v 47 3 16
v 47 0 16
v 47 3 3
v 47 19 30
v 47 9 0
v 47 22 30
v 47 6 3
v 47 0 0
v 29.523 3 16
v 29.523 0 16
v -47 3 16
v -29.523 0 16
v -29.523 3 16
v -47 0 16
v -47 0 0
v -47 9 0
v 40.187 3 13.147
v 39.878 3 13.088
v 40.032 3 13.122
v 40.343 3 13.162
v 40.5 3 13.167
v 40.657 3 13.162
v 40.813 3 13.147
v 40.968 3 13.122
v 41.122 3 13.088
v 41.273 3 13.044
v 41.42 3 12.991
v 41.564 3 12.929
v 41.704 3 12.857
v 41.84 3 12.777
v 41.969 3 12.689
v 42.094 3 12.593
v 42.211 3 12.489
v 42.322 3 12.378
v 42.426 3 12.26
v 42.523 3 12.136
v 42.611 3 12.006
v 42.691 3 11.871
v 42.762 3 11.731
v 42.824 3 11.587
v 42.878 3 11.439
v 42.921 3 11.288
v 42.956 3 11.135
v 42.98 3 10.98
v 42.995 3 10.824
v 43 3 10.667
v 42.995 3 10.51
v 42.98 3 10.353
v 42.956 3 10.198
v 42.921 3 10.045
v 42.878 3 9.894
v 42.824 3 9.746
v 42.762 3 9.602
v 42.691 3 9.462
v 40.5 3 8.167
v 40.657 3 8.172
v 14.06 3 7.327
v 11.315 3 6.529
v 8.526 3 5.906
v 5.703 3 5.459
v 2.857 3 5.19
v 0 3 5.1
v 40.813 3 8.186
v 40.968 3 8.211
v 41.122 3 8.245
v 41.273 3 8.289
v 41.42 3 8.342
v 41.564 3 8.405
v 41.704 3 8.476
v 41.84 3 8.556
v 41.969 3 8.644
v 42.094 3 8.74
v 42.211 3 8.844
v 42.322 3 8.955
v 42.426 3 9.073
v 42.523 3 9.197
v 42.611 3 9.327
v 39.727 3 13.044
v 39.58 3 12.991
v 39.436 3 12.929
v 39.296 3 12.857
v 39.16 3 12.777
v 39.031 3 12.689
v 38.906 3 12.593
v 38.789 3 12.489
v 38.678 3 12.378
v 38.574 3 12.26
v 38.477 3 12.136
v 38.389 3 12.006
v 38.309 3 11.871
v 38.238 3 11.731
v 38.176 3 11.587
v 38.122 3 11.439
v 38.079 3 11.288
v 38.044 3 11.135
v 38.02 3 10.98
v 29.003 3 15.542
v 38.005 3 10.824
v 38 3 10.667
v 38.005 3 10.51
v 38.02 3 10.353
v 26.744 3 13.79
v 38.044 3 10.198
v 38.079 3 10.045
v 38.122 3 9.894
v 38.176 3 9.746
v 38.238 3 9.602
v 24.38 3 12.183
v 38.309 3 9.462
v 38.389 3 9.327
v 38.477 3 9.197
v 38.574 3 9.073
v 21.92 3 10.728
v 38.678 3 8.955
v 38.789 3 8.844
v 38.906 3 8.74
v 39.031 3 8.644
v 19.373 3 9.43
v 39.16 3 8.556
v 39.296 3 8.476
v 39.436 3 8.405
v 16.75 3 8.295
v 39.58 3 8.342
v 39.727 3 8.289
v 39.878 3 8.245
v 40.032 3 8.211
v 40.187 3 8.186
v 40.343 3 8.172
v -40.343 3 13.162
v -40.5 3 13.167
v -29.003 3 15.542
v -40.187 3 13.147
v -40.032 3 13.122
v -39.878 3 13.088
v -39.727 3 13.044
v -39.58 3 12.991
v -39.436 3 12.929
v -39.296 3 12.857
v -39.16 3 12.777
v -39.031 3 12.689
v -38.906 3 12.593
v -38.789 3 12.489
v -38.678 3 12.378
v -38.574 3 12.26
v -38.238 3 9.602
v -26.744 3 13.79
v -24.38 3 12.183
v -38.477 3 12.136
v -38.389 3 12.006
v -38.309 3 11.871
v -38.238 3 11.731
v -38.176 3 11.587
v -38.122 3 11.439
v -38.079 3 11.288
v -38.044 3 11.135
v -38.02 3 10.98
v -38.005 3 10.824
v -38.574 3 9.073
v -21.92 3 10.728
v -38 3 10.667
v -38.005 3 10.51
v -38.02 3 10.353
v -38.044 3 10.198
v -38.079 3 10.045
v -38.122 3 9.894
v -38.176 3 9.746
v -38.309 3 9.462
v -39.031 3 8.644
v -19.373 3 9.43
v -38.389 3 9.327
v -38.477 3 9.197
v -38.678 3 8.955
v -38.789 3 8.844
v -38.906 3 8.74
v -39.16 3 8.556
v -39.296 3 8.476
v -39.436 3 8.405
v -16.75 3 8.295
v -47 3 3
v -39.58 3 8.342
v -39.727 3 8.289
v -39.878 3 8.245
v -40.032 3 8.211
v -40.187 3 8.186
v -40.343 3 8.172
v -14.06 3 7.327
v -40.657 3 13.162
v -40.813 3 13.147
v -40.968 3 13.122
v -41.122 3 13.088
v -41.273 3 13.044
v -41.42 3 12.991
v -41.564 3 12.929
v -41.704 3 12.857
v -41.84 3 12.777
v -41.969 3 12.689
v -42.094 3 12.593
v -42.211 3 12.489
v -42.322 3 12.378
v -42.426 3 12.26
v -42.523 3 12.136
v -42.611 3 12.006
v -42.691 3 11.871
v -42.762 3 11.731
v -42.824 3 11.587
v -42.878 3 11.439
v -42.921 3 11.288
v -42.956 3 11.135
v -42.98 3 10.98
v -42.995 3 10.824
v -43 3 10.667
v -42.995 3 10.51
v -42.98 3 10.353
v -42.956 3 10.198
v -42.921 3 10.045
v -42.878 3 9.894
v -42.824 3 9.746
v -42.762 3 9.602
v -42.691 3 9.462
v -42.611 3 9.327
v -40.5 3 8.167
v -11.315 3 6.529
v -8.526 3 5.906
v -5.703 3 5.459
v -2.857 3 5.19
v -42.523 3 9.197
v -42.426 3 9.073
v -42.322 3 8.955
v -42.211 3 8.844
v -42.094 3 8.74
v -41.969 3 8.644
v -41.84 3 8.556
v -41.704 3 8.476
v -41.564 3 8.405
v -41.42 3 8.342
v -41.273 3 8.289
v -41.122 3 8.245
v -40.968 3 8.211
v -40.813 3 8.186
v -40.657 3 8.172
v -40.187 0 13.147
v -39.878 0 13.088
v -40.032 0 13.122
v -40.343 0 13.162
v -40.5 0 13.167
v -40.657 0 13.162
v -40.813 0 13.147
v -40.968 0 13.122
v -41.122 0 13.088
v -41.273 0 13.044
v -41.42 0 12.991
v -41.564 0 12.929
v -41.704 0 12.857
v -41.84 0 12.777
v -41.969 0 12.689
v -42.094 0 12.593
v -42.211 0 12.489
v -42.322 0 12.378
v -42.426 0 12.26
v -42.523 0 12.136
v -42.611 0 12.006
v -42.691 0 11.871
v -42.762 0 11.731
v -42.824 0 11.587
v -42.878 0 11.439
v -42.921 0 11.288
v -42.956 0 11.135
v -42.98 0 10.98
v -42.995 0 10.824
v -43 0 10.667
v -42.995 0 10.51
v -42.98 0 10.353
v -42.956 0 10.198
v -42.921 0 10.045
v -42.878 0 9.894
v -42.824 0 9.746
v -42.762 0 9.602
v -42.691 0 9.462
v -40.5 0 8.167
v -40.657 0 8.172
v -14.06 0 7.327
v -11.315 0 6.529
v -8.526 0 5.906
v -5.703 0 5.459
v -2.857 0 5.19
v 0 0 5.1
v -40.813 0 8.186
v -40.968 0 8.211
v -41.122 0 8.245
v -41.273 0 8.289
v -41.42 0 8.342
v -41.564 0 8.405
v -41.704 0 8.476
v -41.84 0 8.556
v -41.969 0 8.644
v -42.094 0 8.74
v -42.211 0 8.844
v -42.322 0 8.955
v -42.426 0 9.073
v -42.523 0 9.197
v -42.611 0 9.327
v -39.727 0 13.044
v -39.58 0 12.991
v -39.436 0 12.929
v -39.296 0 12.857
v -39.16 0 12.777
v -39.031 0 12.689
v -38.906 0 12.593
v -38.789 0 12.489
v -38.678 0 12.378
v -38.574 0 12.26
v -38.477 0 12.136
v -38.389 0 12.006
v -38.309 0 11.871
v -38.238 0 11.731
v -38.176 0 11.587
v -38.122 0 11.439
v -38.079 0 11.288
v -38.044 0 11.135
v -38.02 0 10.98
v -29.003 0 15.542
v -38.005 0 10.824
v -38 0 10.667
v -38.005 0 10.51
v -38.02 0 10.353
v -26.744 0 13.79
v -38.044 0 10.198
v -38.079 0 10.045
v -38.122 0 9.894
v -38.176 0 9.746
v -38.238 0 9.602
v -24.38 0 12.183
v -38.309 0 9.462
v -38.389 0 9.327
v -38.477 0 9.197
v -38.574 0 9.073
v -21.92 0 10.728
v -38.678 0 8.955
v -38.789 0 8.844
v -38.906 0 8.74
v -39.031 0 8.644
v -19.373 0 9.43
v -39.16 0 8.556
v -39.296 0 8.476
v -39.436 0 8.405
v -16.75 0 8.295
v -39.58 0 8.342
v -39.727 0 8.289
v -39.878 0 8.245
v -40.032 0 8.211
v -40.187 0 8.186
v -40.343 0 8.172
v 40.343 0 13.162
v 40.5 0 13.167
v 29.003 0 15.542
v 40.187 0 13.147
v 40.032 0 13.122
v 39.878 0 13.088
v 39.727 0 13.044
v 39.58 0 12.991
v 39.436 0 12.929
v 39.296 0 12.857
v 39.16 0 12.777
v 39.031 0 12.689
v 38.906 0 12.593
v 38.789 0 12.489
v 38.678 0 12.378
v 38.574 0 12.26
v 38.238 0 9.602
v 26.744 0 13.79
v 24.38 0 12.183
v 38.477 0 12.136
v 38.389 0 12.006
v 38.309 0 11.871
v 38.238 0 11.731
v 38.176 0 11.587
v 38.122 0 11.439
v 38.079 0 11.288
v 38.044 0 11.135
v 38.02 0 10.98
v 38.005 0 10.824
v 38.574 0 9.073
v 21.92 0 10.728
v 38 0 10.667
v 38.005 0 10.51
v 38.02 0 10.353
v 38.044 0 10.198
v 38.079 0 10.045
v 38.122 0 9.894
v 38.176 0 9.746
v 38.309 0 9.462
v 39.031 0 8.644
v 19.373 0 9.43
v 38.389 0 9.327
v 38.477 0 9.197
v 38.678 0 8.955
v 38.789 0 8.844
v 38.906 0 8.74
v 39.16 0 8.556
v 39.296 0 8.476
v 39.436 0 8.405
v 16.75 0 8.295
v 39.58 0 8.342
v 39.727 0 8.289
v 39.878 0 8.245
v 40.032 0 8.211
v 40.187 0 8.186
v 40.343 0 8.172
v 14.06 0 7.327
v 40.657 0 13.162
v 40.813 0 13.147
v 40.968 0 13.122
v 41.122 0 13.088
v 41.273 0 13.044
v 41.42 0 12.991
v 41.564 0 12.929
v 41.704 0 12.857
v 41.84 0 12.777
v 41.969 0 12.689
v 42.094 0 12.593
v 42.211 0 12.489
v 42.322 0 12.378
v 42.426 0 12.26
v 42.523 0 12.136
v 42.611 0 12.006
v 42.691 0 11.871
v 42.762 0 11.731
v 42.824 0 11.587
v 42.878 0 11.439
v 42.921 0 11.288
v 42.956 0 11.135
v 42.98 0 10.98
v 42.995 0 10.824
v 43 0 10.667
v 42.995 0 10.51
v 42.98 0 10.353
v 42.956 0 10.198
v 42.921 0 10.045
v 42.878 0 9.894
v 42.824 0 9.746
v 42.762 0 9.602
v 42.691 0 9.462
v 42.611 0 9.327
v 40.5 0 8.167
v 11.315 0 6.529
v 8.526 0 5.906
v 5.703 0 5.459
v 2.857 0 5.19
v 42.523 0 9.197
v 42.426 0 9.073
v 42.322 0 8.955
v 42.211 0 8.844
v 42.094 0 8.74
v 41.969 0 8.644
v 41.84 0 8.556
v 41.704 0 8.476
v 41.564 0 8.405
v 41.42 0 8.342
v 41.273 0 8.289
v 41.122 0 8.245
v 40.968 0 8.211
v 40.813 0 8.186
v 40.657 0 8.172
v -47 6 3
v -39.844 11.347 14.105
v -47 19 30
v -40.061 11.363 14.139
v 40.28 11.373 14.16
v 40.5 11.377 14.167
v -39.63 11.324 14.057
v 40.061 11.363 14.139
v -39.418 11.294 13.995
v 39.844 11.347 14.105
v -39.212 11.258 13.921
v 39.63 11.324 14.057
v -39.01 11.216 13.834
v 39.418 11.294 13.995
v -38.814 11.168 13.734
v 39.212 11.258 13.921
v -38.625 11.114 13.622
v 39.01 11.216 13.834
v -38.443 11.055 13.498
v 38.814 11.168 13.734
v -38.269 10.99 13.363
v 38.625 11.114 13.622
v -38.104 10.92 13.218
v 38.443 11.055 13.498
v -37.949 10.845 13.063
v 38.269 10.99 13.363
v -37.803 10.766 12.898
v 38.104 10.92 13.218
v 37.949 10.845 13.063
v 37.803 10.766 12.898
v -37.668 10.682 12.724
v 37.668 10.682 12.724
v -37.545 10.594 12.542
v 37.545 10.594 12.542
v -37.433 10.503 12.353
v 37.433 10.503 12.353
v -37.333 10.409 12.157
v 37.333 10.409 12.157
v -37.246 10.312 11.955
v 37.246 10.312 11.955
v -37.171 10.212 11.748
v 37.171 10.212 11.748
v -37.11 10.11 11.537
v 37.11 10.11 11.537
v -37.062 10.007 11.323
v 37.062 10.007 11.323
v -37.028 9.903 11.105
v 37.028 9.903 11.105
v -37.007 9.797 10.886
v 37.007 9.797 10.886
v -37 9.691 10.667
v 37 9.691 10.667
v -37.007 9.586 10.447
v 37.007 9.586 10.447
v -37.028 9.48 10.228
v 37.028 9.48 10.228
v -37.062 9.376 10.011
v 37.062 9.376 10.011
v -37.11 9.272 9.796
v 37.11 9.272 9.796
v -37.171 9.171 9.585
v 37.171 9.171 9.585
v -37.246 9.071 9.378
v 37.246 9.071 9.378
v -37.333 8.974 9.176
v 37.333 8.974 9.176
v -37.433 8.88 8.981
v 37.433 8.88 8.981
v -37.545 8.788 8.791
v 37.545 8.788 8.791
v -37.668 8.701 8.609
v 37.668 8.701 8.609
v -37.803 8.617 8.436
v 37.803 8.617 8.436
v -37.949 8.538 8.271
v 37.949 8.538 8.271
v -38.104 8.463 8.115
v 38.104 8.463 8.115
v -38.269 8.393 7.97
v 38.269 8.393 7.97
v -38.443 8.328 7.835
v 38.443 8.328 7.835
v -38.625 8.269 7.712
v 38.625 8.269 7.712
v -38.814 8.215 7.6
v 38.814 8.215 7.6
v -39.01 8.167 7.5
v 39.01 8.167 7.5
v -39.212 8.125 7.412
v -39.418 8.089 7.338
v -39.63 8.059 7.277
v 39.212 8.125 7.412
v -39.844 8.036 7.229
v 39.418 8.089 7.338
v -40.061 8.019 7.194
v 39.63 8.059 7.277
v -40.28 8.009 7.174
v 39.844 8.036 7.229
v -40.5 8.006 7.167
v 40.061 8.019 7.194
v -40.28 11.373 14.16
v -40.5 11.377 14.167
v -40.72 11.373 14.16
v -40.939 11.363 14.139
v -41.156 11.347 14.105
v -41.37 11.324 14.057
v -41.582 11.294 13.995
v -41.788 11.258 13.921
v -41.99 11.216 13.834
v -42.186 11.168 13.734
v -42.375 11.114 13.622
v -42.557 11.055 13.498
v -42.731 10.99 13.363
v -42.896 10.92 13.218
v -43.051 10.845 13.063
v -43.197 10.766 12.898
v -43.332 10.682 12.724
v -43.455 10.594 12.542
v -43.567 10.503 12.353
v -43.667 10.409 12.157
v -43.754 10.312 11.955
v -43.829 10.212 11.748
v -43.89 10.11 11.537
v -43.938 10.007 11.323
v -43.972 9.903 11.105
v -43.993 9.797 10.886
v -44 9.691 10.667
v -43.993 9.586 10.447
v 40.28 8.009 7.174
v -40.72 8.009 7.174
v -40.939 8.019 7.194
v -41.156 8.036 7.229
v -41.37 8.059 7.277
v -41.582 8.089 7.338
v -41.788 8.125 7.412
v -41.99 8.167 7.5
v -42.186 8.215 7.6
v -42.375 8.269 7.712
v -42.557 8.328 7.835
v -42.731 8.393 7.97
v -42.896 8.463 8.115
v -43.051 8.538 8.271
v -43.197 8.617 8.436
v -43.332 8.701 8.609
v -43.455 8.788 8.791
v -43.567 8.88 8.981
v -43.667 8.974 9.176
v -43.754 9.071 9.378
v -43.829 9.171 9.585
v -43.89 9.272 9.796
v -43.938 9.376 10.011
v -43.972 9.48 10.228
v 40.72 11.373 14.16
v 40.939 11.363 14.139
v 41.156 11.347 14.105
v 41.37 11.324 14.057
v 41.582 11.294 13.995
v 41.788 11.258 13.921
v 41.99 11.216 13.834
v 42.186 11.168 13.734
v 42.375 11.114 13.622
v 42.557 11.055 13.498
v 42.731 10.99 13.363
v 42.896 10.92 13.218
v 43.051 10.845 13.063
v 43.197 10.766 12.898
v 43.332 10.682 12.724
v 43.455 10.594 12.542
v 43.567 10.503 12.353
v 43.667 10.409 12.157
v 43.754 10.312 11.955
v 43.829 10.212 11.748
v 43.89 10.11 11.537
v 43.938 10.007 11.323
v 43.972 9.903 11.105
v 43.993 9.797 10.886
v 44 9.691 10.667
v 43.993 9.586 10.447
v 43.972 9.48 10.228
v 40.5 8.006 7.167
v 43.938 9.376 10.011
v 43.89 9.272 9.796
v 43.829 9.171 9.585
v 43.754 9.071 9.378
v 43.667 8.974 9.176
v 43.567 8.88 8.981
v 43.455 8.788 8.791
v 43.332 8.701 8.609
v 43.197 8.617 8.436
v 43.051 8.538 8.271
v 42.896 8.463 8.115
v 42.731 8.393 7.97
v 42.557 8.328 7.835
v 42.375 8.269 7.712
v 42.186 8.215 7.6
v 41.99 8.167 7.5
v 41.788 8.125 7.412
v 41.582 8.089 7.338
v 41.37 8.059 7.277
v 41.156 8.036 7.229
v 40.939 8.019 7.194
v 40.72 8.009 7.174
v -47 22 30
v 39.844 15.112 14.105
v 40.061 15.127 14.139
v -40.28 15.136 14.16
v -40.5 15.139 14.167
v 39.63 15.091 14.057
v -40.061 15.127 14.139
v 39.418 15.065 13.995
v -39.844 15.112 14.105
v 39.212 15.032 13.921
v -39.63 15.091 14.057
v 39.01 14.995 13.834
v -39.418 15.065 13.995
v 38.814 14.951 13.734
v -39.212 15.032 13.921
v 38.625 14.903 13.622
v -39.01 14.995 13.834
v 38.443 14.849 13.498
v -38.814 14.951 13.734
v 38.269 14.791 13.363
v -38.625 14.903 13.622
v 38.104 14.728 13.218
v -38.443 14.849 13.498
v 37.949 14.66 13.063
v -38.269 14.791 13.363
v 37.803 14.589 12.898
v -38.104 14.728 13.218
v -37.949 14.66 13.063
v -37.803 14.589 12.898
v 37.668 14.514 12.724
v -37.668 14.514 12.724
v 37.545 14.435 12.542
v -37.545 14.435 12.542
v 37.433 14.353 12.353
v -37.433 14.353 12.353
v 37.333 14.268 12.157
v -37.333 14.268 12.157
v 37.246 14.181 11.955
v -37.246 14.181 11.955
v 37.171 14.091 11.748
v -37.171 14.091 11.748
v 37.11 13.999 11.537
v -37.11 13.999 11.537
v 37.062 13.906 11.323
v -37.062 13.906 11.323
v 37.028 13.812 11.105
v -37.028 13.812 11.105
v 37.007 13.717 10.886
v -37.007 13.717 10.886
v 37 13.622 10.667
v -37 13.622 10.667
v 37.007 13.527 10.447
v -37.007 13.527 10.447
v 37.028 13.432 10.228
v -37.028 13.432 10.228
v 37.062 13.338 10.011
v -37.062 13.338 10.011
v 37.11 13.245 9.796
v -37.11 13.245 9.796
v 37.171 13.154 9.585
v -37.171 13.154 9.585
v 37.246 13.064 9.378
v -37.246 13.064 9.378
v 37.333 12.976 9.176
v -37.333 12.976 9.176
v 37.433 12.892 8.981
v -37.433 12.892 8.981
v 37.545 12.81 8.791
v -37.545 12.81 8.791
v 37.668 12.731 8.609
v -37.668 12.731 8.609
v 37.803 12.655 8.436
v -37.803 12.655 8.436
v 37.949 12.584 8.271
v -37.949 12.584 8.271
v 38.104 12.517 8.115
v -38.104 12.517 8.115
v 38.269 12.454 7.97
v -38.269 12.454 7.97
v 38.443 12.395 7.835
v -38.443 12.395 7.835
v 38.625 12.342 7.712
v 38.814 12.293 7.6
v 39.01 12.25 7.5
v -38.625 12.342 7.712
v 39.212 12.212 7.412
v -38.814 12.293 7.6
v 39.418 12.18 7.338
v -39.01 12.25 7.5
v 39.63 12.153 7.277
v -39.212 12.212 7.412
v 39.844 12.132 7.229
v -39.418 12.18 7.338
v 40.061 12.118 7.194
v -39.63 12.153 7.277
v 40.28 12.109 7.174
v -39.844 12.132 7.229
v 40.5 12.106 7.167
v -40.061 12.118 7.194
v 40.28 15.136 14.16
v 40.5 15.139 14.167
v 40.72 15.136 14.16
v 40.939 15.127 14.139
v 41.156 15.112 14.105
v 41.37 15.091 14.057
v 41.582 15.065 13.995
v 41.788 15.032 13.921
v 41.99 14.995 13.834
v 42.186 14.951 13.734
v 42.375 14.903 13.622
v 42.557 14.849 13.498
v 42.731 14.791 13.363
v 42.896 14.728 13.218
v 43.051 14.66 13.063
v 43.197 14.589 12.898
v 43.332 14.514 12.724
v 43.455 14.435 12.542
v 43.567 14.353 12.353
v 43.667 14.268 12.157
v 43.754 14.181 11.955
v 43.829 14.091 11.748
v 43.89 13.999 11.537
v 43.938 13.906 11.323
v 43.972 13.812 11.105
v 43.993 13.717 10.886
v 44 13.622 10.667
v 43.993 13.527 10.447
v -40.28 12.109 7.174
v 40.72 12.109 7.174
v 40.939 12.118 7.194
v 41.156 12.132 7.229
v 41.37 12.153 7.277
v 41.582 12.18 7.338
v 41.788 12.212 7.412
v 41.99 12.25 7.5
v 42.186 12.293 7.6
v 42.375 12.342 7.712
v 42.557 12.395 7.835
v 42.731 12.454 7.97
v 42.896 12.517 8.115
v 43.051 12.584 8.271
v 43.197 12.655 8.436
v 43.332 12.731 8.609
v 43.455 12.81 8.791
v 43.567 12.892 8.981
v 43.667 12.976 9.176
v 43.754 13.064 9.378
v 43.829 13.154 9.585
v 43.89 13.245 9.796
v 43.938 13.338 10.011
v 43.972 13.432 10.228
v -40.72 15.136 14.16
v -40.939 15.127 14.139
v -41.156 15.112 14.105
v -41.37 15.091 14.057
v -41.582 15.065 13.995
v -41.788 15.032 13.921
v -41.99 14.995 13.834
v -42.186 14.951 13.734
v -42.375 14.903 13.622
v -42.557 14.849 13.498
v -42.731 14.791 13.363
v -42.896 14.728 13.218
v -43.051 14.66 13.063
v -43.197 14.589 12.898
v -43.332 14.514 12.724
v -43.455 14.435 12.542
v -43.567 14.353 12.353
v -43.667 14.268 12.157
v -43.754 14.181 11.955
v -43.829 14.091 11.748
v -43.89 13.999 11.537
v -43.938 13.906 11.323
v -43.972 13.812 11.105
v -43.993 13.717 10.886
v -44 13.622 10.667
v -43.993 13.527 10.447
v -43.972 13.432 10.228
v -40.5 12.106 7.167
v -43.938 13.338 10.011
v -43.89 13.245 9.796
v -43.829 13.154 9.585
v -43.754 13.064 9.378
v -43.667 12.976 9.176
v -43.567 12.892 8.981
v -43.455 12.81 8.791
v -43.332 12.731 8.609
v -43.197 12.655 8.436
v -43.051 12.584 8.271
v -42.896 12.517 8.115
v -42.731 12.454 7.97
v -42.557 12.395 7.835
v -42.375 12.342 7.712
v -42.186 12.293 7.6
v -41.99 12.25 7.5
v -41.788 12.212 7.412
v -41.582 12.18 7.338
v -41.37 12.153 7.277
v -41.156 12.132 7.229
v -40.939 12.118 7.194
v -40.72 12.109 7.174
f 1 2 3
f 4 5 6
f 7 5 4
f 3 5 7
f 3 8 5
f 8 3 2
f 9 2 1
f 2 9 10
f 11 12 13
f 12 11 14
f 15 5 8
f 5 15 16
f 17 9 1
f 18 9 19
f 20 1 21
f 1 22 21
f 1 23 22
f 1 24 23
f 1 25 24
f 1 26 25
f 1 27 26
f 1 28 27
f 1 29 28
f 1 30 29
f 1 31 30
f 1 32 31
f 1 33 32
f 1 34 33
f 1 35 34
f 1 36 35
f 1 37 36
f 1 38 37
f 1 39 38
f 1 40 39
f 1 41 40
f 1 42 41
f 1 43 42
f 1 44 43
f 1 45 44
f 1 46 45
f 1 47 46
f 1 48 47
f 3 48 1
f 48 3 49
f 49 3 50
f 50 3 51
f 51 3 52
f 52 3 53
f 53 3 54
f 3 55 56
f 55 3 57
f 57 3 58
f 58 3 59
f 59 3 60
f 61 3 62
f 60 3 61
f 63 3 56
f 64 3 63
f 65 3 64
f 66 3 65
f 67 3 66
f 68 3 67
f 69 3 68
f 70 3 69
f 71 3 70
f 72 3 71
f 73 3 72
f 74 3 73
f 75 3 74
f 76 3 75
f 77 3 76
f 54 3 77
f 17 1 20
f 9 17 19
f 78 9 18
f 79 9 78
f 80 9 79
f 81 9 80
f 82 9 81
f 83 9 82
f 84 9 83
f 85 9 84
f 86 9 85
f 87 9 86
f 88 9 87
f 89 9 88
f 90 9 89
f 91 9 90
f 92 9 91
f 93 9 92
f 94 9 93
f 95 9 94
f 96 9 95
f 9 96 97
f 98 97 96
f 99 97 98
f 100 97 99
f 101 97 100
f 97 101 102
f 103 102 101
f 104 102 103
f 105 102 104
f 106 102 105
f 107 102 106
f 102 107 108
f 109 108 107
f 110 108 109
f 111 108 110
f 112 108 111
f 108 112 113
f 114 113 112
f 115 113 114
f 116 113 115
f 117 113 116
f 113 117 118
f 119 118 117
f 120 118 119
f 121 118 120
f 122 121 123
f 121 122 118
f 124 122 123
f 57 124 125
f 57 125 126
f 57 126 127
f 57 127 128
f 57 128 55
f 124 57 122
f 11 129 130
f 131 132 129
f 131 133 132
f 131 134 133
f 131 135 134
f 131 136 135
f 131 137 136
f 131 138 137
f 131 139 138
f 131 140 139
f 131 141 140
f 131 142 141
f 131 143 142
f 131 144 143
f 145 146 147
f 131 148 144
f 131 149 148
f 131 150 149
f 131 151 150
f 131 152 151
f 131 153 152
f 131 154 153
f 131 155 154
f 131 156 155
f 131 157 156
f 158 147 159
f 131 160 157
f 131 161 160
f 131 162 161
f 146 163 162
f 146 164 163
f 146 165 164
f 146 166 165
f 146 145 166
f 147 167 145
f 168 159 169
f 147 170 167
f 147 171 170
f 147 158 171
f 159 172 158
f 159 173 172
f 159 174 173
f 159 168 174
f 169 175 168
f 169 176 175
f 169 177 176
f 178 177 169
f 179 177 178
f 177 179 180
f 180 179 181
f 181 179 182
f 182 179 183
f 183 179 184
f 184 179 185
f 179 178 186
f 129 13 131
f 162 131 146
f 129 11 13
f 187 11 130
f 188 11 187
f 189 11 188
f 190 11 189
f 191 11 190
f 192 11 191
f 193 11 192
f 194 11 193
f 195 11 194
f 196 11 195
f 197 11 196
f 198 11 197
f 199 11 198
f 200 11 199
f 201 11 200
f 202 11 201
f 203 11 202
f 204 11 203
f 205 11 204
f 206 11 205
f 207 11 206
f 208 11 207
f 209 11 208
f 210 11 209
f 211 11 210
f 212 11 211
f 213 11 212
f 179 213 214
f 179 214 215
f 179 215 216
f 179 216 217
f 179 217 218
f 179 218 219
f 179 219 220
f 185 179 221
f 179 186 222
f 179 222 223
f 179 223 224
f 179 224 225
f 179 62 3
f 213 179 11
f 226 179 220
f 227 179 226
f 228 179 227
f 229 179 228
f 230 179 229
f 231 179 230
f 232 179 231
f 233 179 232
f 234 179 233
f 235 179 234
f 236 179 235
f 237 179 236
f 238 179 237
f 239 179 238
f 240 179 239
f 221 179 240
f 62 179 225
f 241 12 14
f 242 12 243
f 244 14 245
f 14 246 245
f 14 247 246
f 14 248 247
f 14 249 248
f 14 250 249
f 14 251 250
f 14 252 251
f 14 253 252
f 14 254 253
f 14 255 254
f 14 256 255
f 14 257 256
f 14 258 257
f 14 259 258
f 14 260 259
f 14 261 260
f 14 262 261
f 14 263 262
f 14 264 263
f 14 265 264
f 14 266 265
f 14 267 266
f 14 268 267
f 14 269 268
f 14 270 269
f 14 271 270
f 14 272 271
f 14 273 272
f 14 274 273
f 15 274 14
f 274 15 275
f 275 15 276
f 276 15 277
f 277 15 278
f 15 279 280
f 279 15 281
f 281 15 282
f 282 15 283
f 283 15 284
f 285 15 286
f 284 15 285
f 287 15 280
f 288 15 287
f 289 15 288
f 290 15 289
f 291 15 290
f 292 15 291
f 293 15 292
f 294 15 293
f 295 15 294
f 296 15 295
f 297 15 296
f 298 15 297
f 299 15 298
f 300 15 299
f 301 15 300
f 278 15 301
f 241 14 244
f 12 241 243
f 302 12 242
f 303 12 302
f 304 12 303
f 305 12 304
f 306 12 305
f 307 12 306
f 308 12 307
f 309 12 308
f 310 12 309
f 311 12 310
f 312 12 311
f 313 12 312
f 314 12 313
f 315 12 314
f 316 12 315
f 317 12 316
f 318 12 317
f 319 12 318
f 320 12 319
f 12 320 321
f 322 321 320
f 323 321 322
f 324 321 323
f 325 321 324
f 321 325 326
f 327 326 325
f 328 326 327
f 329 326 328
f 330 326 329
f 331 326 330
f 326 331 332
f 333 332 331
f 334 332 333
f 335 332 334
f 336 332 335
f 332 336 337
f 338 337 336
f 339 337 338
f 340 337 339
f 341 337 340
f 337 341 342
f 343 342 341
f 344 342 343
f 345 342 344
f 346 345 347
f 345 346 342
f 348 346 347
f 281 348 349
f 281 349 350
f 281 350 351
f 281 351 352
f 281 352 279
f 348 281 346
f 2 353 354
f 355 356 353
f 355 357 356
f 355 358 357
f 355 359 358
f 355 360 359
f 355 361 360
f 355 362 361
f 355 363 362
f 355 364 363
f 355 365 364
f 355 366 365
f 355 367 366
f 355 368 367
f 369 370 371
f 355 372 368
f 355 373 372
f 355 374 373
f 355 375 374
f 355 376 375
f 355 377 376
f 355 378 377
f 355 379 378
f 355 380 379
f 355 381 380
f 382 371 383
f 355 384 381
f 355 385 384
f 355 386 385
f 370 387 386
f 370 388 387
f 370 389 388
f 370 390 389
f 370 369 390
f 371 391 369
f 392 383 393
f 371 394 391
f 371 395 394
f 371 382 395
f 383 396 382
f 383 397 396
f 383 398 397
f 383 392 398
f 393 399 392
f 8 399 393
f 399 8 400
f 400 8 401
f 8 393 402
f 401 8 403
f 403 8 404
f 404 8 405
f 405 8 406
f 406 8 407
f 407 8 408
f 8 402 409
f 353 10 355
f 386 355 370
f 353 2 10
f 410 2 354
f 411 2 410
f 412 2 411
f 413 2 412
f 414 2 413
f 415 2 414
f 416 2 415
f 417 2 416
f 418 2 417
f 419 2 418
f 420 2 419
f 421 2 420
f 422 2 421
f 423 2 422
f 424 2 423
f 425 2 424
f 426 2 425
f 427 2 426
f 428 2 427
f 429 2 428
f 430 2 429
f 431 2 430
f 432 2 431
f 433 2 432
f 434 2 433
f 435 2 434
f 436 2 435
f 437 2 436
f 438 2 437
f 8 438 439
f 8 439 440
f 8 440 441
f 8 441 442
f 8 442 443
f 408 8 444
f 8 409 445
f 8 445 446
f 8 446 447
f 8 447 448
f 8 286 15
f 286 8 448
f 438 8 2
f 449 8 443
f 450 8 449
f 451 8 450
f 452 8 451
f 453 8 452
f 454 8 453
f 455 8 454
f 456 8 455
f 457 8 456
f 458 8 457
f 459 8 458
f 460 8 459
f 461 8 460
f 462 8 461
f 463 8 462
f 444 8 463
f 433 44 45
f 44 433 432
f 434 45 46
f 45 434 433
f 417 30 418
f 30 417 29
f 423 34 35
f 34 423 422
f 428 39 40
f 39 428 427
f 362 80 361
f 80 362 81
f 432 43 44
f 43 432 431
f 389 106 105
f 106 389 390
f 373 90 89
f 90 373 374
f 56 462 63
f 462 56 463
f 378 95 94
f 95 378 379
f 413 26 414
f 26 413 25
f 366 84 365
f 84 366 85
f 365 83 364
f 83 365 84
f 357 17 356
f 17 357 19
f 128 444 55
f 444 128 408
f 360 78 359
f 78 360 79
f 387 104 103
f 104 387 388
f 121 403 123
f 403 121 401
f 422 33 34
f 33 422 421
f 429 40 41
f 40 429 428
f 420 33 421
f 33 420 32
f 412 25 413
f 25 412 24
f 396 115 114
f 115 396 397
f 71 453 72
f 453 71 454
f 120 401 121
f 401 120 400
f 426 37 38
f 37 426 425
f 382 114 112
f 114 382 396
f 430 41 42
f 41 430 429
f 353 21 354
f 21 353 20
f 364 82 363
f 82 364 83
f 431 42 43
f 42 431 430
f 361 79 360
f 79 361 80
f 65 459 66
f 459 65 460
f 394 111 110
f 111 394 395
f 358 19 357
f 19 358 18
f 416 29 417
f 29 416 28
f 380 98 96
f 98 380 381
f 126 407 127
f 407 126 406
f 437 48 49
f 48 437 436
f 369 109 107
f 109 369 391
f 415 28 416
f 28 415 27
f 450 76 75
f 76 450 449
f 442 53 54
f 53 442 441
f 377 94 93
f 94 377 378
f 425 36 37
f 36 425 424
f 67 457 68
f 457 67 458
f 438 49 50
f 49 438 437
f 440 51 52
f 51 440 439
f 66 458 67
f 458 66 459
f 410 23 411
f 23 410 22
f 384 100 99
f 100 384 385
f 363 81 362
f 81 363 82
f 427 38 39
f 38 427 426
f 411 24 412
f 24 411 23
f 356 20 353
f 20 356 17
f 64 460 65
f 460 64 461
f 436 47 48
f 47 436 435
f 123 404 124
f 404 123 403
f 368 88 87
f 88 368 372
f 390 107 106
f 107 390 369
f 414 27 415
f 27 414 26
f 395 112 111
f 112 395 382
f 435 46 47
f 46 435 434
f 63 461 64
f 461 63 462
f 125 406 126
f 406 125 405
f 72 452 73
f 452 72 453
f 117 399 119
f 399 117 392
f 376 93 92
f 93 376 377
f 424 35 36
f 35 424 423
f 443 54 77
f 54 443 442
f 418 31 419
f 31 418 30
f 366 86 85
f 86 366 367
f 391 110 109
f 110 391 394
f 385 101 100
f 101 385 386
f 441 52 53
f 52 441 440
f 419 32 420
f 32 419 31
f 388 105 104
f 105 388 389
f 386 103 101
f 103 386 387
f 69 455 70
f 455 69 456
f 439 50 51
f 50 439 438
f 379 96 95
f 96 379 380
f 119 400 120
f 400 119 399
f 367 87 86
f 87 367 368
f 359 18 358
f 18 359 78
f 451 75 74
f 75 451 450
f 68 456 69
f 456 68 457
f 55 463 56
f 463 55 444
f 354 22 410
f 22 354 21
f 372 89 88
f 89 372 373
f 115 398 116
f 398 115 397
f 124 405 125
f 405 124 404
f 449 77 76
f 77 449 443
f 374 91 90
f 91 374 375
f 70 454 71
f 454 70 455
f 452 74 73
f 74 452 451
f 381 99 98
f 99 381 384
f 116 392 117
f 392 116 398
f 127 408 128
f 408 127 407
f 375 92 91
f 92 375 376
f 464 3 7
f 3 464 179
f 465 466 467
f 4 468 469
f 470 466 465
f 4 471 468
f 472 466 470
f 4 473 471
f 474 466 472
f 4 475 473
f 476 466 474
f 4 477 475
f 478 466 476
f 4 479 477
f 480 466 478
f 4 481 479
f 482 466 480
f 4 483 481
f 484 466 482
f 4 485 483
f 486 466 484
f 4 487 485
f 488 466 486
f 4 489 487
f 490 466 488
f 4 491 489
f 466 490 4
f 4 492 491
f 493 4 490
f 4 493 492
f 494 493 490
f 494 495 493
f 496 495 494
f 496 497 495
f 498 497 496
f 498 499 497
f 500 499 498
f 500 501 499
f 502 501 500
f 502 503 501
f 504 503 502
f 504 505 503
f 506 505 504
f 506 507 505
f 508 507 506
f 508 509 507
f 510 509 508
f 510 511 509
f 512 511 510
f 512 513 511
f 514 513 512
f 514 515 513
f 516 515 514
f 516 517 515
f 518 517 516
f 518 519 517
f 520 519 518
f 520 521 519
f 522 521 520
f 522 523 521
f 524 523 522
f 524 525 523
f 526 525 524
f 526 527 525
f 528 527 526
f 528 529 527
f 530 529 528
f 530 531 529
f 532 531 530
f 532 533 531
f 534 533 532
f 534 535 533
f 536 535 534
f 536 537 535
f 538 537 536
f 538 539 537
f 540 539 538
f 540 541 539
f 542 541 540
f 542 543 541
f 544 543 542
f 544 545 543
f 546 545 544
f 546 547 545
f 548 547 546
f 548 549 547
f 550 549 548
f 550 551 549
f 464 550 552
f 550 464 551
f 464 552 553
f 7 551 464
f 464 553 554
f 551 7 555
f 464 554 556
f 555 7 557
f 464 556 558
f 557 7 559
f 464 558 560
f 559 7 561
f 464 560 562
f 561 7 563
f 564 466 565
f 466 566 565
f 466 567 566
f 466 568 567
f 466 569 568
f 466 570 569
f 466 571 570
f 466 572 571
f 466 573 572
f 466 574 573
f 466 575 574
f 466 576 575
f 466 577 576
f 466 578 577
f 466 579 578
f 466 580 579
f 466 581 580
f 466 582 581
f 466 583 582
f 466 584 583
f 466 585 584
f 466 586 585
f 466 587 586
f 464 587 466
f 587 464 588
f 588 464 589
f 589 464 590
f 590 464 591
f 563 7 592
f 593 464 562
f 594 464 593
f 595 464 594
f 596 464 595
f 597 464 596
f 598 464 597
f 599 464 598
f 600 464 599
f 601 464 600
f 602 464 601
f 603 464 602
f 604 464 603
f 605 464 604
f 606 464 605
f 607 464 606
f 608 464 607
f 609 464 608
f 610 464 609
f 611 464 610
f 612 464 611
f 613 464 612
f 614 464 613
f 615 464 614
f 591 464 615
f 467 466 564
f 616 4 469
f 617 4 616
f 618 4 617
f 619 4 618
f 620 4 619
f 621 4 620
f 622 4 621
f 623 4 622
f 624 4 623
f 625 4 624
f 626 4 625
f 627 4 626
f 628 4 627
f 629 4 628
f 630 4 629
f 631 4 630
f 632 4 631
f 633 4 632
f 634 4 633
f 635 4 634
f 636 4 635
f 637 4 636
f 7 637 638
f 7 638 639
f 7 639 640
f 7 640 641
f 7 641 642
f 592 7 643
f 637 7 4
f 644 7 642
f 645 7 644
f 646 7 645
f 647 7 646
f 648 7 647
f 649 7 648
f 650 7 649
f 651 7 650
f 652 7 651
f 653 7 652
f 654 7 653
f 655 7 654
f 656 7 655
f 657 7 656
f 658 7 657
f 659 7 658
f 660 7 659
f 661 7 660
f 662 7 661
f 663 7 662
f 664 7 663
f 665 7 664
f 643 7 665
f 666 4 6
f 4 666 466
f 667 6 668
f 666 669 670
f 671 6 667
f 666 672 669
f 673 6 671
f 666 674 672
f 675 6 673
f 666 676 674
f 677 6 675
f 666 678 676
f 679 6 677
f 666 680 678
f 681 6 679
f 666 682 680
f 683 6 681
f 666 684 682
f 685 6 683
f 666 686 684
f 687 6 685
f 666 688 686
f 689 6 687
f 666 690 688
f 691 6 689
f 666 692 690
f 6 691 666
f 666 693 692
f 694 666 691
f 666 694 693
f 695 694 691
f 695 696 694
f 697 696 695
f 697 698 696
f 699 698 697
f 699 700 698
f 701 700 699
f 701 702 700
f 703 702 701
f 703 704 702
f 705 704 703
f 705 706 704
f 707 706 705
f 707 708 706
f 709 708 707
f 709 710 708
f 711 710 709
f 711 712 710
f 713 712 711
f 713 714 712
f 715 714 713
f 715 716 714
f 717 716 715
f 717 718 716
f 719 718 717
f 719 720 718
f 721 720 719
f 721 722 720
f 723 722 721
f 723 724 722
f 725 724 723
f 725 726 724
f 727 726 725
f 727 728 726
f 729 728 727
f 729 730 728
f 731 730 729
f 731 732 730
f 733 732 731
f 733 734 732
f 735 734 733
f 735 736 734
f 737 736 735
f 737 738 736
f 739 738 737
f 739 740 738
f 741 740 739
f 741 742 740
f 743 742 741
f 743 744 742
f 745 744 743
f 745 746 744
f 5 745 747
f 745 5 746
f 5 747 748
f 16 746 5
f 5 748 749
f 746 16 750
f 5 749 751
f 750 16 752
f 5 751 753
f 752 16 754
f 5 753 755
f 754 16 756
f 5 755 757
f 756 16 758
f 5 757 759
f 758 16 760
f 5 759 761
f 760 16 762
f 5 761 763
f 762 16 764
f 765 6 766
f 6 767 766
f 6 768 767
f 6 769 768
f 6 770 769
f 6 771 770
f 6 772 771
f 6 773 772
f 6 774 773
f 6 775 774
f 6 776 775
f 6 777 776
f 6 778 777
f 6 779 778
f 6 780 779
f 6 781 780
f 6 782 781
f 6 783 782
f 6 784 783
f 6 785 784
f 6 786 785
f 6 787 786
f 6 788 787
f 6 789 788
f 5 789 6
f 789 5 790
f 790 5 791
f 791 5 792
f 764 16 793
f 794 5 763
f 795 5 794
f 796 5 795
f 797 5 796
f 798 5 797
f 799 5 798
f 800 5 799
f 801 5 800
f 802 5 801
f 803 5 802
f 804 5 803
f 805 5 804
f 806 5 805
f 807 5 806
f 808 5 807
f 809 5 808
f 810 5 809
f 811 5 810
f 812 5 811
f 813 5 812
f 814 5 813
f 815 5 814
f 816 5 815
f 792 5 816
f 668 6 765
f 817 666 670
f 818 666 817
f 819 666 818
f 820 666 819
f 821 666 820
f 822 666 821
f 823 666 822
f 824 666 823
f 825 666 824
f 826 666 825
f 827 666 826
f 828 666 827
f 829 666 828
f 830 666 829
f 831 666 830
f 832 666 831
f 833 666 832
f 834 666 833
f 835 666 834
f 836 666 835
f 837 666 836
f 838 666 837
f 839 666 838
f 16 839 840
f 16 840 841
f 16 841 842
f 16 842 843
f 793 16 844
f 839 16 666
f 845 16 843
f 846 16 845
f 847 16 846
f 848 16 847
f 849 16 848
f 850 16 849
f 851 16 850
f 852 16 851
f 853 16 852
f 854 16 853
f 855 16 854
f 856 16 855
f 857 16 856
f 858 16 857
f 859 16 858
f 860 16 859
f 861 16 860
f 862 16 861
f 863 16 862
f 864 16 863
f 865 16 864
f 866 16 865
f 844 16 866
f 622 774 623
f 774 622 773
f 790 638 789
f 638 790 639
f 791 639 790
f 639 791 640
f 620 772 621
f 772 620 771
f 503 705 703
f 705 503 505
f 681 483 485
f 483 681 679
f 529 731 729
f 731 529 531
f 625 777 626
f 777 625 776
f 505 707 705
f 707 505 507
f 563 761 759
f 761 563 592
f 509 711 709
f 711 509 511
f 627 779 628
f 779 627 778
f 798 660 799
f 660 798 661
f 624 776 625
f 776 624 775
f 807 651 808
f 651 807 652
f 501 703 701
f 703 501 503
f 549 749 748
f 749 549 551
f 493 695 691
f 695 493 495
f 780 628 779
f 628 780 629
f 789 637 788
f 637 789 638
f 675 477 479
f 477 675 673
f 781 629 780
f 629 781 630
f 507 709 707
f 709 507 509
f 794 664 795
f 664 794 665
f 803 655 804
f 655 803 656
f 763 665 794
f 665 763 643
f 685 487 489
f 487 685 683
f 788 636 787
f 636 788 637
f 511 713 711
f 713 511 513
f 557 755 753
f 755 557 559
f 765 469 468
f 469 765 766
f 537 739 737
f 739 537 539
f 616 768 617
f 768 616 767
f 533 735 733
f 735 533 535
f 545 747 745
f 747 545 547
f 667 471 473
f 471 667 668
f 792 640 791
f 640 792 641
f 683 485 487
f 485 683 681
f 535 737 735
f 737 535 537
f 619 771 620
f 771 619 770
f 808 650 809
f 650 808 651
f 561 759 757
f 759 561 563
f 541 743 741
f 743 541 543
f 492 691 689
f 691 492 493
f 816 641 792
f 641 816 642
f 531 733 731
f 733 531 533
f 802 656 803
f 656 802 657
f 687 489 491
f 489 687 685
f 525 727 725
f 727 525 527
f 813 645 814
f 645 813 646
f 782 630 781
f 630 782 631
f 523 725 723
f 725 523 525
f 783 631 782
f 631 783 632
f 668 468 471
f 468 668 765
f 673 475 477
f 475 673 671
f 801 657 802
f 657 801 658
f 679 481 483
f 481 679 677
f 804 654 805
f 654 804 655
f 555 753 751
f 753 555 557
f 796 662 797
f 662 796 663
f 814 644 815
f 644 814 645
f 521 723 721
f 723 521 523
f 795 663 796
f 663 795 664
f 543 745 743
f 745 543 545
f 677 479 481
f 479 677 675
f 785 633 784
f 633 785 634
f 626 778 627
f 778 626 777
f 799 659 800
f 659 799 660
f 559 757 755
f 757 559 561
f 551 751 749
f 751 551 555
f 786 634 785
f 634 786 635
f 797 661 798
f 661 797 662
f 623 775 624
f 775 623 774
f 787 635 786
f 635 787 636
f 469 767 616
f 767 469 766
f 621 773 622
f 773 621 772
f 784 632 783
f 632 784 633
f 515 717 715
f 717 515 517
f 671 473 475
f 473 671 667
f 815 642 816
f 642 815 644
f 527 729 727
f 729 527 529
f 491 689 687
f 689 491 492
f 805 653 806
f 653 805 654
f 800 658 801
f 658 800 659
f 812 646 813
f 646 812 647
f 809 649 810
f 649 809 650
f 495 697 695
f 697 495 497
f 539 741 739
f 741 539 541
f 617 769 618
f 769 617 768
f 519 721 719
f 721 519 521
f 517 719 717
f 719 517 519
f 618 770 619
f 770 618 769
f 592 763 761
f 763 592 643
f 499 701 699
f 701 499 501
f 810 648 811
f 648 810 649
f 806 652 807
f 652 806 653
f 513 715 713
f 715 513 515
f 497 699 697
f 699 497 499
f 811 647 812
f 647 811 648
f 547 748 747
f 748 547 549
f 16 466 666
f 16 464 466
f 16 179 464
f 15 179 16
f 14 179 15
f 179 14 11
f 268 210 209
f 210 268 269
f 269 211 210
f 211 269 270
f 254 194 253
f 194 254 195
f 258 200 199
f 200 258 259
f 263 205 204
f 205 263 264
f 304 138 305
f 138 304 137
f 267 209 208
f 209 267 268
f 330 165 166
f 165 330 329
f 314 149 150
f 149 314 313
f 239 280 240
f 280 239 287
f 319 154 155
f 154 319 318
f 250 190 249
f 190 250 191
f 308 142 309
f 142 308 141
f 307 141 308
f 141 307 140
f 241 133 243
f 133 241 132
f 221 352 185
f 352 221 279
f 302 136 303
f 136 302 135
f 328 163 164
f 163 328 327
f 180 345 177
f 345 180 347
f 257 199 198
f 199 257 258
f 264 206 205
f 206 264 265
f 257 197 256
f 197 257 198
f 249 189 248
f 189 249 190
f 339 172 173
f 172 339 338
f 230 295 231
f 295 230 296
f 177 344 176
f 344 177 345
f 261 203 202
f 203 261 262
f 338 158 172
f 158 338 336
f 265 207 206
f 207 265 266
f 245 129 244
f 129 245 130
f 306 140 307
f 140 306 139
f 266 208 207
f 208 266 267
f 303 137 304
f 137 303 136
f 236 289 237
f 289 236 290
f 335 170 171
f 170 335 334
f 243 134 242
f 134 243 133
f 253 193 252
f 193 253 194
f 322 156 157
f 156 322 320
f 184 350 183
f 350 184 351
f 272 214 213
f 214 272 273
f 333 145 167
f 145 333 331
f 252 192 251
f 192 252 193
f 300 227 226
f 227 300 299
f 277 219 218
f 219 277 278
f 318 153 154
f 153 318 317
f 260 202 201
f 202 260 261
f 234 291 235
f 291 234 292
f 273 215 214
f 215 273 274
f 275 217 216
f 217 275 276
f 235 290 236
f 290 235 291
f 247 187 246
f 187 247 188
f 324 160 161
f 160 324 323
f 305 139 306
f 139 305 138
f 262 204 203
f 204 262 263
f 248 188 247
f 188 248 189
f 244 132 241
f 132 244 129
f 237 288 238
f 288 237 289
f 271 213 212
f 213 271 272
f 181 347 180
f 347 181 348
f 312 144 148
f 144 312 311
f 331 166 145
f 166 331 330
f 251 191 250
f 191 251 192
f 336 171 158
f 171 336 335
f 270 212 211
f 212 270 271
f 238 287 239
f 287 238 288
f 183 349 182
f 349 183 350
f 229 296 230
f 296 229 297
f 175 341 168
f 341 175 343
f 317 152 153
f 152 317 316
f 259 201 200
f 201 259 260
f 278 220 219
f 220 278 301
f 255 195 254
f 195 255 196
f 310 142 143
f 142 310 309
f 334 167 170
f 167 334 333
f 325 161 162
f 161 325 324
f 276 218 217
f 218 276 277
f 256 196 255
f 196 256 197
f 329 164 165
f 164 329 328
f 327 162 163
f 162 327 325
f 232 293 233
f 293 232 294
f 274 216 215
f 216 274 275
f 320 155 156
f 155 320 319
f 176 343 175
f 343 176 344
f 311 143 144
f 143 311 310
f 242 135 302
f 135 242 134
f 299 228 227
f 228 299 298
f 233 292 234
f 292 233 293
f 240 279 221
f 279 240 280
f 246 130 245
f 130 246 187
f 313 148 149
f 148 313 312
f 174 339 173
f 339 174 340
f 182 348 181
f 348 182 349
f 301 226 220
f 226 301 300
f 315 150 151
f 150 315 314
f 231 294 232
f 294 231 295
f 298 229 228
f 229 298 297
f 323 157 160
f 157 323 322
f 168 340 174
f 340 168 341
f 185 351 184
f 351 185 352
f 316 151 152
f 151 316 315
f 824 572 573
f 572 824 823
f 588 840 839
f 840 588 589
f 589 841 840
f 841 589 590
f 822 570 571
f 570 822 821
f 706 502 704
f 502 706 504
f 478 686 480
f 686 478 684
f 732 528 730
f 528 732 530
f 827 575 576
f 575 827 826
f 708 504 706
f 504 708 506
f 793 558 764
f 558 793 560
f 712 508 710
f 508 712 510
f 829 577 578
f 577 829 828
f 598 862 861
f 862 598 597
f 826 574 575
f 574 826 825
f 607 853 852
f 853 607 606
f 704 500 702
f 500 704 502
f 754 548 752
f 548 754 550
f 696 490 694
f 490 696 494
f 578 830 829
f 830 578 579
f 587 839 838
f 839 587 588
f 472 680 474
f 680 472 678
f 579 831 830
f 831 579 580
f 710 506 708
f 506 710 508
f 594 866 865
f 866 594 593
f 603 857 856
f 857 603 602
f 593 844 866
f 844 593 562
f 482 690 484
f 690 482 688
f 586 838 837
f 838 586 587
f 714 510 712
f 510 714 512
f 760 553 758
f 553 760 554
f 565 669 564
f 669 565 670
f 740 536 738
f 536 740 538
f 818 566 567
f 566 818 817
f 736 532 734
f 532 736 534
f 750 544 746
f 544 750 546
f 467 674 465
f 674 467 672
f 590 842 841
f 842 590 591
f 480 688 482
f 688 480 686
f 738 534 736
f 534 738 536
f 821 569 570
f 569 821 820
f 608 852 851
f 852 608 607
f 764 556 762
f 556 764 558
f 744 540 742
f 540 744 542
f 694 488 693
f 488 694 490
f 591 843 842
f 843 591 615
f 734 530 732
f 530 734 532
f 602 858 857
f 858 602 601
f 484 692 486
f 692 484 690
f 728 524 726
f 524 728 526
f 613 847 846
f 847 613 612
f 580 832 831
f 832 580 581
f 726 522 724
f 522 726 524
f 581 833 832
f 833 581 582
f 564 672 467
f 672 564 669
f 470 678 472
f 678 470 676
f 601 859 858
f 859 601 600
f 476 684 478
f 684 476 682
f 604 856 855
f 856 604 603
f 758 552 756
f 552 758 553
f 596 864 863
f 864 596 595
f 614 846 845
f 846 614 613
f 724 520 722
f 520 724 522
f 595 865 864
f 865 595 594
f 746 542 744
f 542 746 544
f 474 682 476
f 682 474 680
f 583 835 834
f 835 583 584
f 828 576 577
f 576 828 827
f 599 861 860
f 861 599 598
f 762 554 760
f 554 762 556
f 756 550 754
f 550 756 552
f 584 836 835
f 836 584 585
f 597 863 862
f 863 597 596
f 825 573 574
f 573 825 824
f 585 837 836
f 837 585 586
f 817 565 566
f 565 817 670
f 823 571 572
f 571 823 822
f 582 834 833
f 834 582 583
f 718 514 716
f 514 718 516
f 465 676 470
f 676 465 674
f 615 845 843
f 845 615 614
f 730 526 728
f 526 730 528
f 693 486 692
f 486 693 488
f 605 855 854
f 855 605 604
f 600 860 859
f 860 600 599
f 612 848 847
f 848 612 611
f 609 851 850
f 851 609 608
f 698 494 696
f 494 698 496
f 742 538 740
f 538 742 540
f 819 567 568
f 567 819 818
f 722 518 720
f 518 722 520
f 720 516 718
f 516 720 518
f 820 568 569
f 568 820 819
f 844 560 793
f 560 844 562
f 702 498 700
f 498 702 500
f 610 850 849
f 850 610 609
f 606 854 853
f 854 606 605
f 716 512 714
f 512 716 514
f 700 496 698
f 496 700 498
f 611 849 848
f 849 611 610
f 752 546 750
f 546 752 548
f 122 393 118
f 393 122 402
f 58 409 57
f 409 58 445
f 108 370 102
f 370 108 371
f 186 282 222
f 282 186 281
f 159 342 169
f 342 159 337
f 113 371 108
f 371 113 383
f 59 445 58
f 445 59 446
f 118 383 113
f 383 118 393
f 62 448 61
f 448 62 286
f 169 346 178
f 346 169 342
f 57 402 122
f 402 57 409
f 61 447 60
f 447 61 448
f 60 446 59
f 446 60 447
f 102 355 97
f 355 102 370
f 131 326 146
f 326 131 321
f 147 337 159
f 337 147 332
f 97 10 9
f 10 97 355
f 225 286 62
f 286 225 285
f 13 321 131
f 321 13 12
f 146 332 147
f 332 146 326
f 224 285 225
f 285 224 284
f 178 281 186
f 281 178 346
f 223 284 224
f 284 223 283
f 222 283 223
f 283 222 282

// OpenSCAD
// Thickness of part surfaces. 3mm will give a robust part.
thickness = 3;
// Distance in mm that fin will go away from the fan.
fin_height = 22;
// Distance in mm between tilt section and mounting section.
spacer = 3;
// Distance into the fan that the fin tilts inward towards the fan.
fin_tilt = 30; // [0:50]
// The center-to-center distance between fan mounting holes, used for sizing the fan mount plate.
fan_mounting_hole_seperation = 81;
// Size of hole for the chassis mount screw.
fan_screw_hole_diameter = 5;
// Diameter in mm of your screw or screwdriver, whichever is larger. Or zero if you can mount from the other side.
access_hole_diameter = 7;

module fan_stand(thickness, space, height, tilt, fan_hole_sep)
{
	// Calculate sizes of parts (some calculations are done below).
	fan_dia = fan_mounting_hole_seperation + 2*fan_screw_hole_diameter;
	// These two are overridden below because OpenSCAD can't assign
	// values inside conditionals.
	mount_width = 2 * fan_screw_hole_diameter + 2 * thickness;
	width = fan_dia/2+thickness/2;

	// =============================== //
	// Fin
	// =============================== //

	module fin(screw_height) {
		adjusted_fin_height = height - space - thickness*2;
		difference() {
			union() {
				// spacer
				translate([0, thickness, 0])
				cube([width, spacer, thickness]);

				// fin
				translate([0, thickness+space, 0])
				rotate([0,90,0])
				linear_extrude(height=width) {
					// Trapazoidal polygon.
					polygon(points=[[0, thickness], [0, 0], [-thickness, 0],
						[-tilt, adjusted_fin_height], [-tilt, adjusted_fin_height+thickness]]);
				}
			}

			// Cut access hole for fan mount screw
			translate([fan_hole_sep/2, 2*thickness + height,screw_height]) 
			rotate([90,0,0])
			cylinder(h=height+2, r=access_hole_diameter/2, center = false, $fn=100);
		}


	}

	// =============================== //

	module fan_mount(x, y, z, screw_height) {
		difference() {
			cube([x, y, z]);

			// Cut fan mount screw hole
			translate([fan_hole_sep/2, thickness+1, screw_height]) 
			rotate([90,0,0])
			cylinder(h=thickness+2, r=fan_screw_hole_diameter/2, center = false, $fn=100);
		}
	}

	// =============================== //
	// Assembly
	// =============================== //

	module half_of_mount() {
		// Create half
		union() {
			// Fan mount (conditional accounts for small screw hole).
			if (mount_width < thickness) {
				fan_mount(width, thickness, thickness*3, z/3 * 2);
				fin(z/3 * 2);
			} else {
				fan_mount(width, thickness, mount_width, mount_width/3*2);
				fin(mount_width/3 * 2);
			}				
		}
	}

	// Create and join both halves.
	module complete_mount() {
		union() {
			// First half
			half_of_mount();

			// Second half
			mirror([1, 0, 0])
			half_of_mount();
		}
	}

	// Create mount and cut out the air hole.
	difference() {
		complete_mount();

		// Air cutout
		translate([0, thickness*1.5, fan_dia/2 + thickness*1.7]) rotate([90,0,0])
		cylinder(h=thickness*3, r=fan_dia/2, center = false, $fn=100);
	}
}

fan_stand(thickness, spacer, fin_height, fin_tilt, fan_mounting_hole_seperation);
